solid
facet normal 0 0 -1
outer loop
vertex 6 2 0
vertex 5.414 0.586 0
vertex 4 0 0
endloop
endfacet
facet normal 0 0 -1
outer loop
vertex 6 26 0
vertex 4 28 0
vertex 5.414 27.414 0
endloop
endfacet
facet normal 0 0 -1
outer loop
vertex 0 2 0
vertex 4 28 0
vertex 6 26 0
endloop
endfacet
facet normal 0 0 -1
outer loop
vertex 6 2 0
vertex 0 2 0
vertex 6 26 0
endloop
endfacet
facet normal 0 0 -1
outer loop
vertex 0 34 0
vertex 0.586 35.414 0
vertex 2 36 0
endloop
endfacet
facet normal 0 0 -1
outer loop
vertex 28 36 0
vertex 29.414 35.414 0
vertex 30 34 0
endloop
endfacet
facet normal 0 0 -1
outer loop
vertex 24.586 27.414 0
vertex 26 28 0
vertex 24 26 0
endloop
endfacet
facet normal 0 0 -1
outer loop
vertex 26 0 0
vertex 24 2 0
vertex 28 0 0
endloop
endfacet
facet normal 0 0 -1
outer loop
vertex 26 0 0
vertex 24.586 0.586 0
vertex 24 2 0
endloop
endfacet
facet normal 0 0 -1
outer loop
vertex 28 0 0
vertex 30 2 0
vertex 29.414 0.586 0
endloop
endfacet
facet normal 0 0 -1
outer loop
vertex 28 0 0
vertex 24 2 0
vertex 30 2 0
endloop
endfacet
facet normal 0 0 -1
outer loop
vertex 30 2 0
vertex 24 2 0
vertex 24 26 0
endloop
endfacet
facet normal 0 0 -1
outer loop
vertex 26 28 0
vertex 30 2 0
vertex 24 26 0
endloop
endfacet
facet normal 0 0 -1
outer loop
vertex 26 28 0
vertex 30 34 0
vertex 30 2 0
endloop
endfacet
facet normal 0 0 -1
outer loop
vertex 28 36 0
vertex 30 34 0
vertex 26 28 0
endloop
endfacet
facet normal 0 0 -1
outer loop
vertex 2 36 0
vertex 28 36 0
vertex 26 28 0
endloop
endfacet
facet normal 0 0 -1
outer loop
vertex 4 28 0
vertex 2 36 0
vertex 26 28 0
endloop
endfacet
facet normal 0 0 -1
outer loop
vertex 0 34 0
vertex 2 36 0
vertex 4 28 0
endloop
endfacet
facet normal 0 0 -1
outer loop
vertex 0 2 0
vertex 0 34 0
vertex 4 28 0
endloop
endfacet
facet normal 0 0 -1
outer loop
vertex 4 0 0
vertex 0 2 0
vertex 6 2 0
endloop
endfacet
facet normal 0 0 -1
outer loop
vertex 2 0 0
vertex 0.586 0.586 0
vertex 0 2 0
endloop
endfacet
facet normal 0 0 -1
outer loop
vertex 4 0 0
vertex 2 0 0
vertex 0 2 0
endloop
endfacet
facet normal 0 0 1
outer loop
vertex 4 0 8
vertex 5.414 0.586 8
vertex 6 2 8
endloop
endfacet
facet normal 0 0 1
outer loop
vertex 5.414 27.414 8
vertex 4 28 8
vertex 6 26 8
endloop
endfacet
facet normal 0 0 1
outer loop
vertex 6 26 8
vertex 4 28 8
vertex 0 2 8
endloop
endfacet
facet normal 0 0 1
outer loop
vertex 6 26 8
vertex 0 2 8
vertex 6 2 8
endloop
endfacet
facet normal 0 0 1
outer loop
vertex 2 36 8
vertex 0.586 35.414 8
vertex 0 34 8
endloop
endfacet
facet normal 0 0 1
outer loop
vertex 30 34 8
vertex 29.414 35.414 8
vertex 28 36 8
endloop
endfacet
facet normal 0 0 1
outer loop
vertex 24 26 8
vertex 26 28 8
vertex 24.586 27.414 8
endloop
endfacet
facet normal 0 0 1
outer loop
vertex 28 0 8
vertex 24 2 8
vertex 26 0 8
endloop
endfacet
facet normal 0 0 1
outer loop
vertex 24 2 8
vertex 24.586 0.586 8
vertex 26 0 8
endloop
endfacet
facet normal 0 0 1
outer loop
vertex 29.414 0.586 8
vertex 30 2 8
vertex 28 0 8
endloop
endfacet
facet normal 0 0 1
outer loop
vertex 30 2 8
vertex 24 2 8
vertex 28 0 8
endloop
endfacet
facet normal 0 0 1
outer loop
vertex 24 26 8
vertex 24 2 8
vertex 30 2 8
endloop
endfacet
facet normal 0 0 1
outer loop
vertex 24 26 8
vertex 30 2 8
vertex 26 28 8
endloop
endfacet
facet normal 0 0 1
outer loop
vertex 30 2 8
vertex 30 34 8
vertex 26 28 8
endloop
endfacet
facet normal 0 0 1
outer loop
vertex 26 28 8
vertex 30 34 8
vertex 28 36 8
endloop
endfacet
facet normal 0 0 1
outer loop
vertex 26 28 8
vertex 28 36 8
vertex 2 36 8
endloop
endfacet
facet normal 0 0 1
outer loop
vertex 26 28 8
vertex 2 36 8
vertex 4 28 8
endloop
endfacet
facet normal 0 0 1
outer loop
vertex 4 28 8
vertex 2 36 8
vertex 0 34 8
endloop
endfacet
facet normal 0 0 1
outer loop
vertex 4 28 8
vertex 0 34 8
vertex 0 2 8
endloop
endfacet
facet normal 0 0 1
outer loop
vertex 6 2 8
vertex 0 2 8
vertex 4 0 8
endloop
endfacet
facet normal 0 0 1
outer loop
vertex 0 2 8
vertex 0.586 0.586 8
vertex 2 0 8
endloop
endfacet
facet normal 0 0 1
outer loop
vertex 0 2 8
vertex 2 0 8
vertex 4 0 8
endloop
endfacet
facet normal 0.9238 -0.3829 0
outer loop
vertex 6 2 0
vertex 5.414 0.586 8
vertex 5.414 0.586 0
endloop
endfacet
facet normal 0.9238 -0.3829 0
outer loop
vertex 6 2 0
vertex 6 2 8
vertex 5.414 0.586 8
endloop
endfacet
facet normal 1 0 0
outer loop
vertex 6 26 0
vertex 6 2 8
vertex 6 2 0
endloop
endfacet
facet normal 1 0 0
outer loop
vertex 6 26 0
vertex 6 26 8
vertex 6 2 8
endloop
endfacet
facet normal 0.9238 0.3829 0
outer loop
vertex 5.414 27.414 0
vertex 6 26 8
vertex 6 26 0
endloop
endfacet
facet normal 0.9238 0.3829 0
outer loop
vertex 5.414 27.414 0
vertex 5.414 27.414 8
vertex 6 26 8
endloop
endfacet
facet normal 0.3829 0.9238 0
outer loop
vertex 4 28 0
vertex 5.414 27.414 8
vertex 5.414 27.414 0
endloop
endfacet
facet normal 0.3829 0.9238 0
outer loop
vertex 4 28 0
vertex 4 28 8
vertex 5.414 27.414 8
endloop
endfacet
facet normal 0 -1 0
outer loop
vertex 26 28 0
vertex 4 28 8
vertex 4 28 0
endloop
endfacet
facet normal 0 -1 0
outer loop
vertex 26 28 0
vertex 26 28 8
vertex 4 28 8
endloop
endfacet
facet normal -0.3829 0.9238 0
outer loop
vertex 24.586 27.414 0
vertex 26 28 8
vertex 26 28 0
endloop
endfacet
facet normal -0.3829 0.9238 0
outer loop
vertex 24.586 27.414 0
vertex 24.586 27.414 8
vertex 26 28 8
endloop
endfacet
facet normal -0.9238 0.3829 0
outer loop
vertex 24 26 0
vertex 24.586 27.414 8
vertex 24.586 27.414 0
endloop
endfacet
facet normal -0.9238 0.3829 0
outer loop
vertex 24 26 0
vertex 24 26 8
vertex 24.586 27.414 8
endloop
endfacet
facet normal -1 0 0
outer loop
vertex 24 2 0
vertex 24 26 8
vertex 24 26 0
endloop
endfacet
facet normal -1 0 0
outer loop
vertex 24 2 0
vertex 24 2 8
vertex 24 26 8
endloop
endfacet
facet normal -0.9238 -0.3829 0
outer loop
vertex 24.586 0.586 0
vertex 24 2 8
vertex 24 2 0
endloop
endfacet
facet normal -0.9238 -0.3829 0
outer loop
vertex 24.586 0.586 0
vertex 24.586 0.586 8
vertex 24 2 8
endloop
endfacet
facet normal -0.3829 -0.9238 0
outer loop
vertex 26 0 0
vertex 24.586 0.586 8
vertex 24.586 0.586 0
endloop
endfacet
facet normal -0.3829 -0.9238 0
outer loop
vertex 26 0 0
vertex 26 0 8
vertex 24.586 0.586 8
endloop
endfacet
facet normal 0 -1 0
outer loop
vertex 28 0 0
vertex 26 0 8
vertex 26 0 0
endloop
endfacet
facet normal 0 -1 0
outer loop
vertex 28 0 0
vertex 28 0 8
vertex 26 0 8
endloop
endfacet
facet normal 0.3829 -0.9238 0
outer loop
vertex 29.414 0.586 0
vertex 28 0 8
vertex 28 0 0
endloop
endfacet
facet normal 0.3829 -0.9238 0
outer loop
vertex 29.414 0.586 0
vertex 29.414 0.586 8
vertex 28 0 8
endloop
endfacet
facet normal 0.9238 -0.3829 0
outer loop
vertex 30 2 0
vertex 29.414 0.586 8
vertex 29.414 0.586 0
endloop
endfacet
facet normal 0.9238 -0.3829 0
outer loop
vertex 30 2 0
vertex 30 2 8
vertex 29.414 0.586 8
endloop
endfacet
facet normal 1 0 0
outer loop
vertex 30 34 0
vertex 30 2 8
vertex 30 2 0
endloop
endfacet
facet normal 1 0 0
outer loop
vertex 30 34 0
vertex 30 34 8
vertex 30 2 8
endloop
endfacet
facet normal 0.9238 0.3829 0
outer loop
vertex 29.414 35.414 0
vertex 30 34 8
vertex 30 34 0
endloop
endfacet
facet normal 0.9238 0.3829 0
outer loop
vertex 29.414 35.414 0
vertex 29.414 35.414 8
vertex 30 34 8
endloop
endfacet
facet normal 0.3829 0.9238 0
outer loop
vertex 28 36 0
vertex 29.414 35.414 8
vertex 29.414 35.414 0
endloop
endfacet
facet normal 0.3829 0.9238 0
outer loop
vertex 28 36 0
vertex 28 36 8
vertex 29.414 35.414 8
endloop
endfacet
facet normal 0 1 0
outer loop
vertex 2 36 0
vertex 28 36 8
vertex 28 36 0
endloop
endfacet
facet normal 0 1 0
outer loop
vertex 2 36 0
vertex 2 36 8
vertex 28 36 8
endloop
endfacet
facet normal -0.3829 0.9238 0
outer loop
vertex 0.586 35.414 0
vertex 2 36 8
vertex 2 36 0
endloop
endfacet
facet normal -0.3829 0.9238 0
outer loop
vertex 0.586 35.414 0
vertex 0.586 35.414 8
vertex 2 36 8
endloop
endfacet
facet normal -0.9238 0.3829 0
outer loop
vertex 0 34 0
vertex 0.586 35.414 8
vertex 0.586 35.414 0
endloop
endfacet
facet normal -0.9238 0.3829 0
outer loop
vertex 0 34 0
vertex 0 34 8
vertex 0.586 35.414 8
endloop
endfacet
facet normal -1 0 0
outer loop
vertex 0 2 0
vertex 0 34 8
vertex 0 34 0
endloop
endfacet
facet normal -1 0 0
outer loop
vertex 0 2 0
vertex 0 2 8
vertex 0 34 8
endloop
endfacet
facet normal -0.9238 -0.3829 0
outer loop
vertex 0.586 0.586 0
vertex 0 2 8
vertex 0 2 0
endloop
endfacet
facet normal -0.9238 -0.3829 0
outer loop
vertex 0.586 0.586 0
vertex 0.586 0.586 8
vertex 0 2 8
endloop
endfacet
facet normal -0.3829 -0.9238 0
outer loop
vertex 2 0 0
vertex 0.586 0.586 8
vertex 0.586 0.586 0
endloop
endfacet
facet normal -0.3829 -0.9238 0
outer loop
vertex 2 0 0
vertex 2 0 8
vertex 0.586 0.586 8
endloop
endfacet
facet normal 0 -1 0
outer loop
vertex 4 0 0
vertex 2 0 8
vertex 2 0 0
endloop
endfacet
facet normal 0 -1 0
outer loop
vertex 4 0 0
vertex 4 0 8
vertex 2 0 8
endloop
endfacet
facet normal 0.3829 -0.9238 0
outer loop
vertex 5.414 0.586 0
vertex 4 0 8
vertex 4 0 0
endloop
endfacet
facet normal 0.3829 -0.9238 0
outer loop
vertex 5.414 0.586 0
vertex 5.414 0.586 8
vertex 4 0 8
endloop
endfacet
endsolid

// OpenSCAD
$fn = 32;

// ----------------------------------------------------------------------
// Clip blank: staple clip, 8 mm thick
// ----------------------------------------------------------------------

// --- parameters (mm) ---
profile_height = 8;       // extrusion height
profile_points = 24;      // points of the closed outline

profile = [[0, 2], [0.586, 0.586], [2, 0], [4, 0], [5.414, 0.586], [6, 2], [6, 26], [5.414, 27.414], [4, 28], [26, 28], [24.586, 27.414], [24, 26], [24, 2], [24.586, 0.586], [26, 0], [28, 0], [29.414, 0.586], [30, 2], [30, 34], [29.414, 35.414], [28, 36], [2, 36], [0.586, 35.414], [0, 34]];  // single closed polygon, 24 points, counter clockwise

// --- the one profile operation ---
linear_extrude(height = profile_height) polygon(points = profile);
